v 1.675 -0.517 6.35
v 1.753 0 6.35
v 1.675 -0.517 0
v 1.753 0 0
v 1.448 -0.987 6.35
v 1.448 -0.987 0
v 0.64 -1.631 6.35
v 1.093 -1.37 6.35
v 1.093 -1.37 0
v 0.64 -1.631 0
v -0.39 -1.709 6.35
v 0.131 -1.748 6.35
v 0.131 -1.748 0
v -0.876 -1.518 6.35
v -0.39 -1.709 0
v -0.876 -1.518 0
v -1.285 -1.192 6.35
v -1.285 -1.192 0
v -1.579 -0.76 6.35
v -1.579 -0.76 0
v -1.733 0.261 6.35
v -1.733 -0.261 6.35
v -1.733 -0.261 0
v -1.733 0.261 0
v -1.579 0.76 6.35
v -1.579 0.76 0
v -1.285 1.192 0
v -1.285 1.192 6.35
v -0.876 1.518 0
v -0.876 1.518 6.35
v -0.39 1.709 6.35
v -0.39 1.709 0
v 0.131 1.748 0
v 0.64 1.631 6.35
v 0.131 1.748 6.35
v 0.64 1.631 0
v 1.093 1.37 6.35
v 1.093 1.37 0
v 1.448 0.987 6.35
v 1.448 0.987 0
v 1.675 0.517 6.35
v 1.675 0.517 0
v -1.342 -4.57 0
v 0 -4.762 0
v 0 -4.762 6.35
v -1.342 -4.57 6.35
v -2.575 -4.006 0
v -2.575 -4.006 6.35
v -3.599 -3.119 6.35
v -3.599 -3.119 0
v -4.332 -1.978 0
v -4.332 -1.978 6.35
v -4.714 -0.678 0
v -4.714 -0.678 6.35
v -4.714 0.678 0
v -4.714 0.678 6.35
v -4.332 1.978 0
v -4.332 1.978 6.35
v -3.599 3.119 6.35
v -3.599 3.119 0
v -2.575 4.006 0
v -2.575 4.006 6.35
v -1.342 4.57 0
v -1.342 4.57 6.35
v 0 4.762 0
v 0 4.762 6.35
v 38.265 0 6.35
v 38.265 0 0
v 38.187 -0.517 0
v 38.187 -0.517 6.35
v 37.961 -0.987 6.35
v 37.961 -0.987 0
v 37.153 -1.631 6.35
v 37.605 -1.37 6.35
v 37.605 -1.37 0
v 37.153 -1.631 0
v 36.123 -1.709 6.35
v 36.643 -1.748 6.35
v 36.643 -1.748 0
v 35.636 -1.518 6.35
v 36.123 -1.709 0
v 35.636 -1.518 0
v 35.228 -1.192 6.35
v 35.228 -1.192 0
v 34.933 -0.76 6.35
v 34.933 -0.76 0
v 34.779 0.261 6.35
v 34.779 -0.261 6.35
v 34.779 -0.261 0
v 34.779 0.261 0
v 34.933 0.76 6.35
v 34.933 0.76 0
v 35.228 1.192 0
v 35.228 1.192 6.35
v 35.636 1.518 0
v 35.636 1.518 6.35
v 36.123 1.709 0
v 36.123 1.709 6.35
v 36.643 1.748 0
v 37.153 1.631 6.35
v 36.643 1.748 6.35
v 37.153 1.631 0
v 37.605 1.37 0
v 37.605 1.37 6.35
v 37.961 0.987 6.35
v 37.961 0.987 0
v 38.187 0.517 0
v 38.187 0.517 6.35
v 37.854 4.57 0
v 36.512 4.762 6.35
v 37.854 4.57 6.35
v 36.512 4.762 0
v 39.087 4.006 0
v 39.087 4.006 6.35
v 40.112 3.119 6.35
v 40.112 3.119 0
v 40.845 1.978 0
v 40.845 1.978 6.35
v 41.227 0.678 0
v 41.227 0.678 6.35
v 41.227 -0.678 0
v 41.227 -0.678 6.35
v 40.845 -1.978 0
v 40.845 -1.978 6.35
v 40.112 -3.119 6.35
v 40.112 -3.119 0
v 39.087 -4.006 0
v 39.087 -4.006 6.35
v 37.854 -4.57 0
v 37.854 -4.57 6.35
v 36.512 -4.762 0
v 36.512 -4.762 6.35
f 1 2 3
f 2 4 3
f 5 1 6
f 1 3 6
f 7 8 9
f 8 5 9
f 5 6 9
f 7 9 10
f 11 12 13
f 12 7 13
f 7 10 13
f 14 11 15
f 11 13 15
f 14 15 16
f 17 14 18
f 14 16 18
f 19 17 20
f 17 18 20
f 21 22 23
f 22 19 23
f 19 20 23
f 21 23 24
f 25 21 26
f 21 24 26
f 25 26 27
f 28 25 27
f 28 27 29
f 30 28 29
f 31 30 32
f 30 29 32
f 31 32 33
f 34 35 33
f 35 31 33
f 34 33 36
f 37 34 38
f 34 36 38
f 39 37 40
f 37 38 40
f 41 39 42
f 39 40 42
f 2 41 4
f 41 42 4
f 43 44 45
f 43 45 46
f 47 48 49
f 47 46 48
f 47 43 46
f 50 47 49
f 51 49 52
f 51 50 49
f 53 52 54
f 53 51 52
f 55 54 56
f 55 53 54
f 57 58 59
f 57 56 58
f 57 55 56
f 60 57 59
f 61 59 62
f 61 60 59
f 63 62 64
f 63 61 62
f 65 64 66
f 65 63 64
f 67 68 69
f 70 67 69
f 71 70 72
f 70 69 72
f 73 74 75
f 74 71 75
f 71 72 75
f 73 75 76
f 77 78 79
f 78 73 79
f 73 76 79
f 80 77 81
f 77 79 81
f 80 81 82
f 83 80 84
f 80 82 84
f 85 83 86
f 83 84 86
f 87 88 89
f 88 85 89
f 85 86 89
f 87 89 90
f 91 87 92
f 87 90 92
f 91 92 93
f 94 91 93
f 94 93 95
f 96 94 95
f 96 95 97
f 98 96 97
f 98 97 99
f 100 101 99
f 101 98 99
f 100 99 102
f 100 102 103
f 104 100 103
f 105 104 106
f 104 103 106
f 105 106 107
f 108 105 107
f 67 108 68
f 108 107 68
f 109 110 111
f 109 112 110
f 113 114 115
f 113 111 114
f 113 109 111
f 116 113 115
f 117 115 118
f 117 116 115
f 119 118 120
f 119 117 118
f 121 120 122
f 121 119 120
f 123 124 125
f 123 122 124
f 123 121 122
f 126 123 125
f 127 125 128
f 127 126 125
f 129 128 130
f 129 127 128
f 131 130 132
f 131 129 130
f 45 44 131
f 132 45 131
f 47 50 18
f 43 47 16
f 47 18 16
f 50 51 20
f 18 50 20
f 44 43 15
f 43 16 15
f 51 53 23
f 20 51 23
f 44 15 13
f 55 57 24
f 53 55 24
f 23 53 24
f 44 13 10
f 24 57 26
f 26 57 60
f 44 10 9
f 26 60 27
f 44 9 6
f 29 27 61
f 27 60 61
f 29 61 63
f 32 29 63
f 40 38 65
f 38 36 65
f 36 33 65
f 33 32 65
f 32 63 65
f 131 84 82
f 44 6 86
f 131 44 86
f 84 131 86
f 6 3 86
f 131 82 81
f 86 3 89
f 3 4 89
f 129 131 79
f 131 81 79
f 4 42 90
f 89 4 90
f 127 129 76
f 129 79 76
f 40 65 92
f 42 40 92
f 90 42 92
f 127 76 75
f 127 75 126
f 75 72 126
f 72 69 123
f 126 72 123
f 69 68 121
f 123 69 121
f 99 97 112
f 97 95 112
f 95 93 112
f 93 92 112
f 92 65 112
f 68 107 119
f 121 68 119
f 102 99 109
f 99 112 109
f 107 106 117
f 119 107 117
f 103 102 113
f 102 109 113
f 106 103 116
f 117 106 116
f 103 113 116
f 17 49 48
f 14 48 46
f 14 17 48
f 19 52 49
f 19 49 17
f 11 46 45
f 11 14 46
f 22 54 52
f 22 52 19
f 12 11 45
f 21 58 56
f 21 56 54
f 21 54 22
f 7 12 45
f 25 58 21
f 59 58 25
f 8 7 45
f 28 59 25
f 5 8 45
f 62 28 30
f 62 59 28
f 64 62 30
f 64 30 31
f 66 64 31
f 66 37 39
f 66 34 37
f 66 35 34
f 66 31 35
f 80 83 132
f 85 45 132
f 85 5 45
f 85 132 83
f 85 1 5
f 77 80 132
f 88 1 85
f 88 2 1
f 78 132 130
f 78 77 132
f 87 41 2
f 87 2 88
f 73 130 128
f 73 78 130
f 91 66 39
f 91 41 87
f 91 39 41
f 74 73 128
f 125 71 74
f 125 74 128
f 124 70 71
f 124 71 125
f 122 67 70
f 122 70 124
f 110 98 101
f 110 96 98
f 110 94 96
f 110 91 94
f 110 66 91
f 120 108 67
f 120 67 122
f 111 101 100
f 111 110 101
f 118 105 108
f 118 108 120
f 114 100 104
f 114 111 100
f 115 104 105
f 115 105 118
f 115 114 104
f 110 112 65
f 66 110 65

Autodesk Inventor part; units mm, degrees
ref_plane "YZ Plane" through (0, 0, 0) normal (1, 0, 0) x (0, 1, 0)
ref_plane "XZ Plane" through (0, 0, 0) normal (0, 1, 0) x (-1, 0, 0)
ref_plane "XY Plane" through (0, 0, 0) normal (0, 0, 1) x (1, 0, 0)
sketch "Sketch1" plane through (0, 0, 0) normal (0, 0, 1) x (1, 0, 0)
  line L0 (0, 0) -> (36.5125, 0) construction
  line L1 (0, -4.7625) -> (36.5125, -4.7625)
  line L2 (36.5125, 4.7625) -> (0, 4.7625)
  arc A0 (0, 4.7625) -> (0, -4.7625) centre (0, 0) ccw
  arc A1 (36.5125, -4.7625) -> (36.5125, 4.7625) centre (36.5125, 0) ccw
  circle A2 centre (0, 0) radius 1.7526
  circle A3 centre (36.5125, 0) radius 1.7526
  point P0 (18.2563, 0)
  dimension "d0" = 36.5125
  dimension "d1" = 9.525
  dimension "d2" = 3.5052
  dimension "d3" = 3.5052
extrude "Extrusion1" add sketch "Sketch1" along normal blind 6.35
equation "\"d0\" = Rail_Offset"
equation "\"d3\" = d2"
equation "\"Rail_Offset\" = 36.5125"
properties part number "Sliders" material "UHMW, White"
